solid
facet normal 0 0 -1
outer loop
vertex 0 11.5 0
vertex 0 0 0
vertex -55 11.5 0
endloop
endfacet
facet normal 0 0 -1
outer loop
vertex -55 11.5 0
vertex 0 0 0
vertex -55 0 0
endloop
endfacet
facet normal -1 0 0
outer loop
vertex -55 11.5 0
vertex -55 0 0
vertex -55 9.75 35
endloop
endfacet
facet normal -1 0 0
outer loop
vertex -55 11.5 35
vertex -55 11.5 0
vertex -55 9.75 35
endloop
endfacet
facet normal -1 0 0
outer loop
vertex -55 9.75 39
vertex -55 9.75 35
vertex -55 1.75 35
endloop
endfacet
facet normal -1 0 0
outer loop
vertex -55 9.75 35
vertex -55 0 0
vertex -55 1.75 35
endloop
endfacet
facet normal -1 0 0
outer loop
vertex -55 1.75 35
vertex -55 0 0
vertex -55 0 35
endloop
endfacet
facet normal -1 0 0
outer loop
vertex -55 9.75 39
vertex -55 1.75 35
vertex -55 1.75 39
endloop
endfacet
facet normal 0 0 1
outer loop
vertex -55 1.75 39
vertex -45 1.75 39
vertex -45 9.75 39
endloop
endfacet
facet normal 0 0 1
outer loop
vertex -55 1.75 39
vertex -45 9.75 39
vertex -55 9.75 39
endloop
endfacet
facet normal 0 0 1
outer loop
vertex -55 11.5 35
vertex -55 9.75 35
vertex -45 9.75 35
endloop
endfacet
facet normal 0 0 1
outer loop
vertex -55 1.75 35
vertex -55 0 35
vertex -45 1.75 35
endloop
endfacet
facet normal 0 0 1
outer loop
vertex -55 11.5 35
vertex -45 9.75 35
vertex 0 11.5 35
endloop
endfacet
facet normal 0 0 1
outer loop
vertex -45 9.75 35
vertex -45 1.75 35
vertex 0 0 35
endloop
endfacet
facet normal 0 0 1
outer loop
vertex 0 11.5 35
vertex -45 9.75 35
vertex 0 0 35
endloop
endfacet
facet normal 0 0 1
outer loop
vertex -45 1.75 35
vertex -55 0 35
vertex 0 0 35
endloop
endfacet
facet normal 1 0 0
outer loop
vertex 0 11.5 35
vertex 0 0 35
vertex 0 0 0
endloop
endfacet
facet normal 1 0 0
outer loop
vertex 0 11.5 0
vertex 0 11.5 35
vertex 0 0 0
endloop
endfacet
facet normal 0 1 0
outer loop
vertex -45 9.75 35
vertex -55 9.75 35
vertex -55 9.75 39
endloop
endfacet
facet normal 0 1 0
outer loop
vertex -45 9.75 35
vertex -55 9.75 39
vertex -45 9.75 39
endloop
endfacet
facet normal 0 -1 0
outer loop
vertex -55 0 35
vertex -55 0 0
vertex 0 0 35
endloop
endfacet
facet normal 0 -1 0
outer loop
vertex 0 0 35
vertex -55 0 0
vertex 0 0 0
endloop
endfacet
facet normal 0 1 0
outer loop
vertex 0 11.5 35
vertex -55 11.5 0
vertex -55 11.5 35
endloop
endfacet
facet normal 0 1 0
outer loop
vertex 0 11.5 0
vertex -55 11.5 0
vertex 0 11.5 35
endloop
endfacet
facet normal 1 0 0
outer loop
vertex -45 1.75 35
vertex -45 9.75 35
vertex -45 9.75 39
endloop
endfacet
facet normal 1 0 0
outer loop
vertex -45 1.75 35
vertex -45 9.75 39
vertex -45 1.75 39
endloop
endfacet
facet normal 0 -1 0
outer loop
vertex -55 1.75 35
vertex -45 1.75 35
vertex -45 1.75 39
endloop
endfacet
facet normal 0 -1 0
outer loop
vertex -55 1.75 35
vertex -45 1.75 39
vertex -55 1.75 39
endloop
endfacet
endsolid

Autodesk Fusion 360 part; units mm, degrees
sketch "Sketch1" plane through (0, 0, 0) normal (0, 1, 0) x (1, 0, 0)
  line L0 (0, 0) -> (-55, 0)
  line L1 (-55, 0) -> (-55, -35)
  line L2 (-55, -35) -> (0, -35)
  line L3 (0, -35) -> (0, 0)
  dimension "d1" = 55
  dimension "d2" = 35
extrude "Extrude1" add sketch "Sketch1" along normal blind 11.5
sketch "Sketch2" plane through (0, 0, 35) normal (0, 0, 1) x (-1, 0, 0)
  line L0 (55, 0) -> (0, 0)
  line L1 (0, 0) -> (0, -11.5)
  line L2 (0, -11.5) -> (55, -11.5)
  line L3 (55, -11.5) -> (55, 0)
  line L4 (55, -9.75) -> (45, -9.75)
  line L5 (45, -9.75) -> (45, -1.75)
  line L6 (45, -1.75) -> (55, -1.75)
  line L7 (55, -1.75) -> (55, -9.75)
  line L8 (45, -5.75) -> (55, -5.75)
  dimension "d5" = 10
  dimension "d6" = 8
extrude "Extrude2" add sketch "Sketch2" along normal blind 4 contours L3 L5 L6 L7 L8 | L3 L4 L5 L7 L8
